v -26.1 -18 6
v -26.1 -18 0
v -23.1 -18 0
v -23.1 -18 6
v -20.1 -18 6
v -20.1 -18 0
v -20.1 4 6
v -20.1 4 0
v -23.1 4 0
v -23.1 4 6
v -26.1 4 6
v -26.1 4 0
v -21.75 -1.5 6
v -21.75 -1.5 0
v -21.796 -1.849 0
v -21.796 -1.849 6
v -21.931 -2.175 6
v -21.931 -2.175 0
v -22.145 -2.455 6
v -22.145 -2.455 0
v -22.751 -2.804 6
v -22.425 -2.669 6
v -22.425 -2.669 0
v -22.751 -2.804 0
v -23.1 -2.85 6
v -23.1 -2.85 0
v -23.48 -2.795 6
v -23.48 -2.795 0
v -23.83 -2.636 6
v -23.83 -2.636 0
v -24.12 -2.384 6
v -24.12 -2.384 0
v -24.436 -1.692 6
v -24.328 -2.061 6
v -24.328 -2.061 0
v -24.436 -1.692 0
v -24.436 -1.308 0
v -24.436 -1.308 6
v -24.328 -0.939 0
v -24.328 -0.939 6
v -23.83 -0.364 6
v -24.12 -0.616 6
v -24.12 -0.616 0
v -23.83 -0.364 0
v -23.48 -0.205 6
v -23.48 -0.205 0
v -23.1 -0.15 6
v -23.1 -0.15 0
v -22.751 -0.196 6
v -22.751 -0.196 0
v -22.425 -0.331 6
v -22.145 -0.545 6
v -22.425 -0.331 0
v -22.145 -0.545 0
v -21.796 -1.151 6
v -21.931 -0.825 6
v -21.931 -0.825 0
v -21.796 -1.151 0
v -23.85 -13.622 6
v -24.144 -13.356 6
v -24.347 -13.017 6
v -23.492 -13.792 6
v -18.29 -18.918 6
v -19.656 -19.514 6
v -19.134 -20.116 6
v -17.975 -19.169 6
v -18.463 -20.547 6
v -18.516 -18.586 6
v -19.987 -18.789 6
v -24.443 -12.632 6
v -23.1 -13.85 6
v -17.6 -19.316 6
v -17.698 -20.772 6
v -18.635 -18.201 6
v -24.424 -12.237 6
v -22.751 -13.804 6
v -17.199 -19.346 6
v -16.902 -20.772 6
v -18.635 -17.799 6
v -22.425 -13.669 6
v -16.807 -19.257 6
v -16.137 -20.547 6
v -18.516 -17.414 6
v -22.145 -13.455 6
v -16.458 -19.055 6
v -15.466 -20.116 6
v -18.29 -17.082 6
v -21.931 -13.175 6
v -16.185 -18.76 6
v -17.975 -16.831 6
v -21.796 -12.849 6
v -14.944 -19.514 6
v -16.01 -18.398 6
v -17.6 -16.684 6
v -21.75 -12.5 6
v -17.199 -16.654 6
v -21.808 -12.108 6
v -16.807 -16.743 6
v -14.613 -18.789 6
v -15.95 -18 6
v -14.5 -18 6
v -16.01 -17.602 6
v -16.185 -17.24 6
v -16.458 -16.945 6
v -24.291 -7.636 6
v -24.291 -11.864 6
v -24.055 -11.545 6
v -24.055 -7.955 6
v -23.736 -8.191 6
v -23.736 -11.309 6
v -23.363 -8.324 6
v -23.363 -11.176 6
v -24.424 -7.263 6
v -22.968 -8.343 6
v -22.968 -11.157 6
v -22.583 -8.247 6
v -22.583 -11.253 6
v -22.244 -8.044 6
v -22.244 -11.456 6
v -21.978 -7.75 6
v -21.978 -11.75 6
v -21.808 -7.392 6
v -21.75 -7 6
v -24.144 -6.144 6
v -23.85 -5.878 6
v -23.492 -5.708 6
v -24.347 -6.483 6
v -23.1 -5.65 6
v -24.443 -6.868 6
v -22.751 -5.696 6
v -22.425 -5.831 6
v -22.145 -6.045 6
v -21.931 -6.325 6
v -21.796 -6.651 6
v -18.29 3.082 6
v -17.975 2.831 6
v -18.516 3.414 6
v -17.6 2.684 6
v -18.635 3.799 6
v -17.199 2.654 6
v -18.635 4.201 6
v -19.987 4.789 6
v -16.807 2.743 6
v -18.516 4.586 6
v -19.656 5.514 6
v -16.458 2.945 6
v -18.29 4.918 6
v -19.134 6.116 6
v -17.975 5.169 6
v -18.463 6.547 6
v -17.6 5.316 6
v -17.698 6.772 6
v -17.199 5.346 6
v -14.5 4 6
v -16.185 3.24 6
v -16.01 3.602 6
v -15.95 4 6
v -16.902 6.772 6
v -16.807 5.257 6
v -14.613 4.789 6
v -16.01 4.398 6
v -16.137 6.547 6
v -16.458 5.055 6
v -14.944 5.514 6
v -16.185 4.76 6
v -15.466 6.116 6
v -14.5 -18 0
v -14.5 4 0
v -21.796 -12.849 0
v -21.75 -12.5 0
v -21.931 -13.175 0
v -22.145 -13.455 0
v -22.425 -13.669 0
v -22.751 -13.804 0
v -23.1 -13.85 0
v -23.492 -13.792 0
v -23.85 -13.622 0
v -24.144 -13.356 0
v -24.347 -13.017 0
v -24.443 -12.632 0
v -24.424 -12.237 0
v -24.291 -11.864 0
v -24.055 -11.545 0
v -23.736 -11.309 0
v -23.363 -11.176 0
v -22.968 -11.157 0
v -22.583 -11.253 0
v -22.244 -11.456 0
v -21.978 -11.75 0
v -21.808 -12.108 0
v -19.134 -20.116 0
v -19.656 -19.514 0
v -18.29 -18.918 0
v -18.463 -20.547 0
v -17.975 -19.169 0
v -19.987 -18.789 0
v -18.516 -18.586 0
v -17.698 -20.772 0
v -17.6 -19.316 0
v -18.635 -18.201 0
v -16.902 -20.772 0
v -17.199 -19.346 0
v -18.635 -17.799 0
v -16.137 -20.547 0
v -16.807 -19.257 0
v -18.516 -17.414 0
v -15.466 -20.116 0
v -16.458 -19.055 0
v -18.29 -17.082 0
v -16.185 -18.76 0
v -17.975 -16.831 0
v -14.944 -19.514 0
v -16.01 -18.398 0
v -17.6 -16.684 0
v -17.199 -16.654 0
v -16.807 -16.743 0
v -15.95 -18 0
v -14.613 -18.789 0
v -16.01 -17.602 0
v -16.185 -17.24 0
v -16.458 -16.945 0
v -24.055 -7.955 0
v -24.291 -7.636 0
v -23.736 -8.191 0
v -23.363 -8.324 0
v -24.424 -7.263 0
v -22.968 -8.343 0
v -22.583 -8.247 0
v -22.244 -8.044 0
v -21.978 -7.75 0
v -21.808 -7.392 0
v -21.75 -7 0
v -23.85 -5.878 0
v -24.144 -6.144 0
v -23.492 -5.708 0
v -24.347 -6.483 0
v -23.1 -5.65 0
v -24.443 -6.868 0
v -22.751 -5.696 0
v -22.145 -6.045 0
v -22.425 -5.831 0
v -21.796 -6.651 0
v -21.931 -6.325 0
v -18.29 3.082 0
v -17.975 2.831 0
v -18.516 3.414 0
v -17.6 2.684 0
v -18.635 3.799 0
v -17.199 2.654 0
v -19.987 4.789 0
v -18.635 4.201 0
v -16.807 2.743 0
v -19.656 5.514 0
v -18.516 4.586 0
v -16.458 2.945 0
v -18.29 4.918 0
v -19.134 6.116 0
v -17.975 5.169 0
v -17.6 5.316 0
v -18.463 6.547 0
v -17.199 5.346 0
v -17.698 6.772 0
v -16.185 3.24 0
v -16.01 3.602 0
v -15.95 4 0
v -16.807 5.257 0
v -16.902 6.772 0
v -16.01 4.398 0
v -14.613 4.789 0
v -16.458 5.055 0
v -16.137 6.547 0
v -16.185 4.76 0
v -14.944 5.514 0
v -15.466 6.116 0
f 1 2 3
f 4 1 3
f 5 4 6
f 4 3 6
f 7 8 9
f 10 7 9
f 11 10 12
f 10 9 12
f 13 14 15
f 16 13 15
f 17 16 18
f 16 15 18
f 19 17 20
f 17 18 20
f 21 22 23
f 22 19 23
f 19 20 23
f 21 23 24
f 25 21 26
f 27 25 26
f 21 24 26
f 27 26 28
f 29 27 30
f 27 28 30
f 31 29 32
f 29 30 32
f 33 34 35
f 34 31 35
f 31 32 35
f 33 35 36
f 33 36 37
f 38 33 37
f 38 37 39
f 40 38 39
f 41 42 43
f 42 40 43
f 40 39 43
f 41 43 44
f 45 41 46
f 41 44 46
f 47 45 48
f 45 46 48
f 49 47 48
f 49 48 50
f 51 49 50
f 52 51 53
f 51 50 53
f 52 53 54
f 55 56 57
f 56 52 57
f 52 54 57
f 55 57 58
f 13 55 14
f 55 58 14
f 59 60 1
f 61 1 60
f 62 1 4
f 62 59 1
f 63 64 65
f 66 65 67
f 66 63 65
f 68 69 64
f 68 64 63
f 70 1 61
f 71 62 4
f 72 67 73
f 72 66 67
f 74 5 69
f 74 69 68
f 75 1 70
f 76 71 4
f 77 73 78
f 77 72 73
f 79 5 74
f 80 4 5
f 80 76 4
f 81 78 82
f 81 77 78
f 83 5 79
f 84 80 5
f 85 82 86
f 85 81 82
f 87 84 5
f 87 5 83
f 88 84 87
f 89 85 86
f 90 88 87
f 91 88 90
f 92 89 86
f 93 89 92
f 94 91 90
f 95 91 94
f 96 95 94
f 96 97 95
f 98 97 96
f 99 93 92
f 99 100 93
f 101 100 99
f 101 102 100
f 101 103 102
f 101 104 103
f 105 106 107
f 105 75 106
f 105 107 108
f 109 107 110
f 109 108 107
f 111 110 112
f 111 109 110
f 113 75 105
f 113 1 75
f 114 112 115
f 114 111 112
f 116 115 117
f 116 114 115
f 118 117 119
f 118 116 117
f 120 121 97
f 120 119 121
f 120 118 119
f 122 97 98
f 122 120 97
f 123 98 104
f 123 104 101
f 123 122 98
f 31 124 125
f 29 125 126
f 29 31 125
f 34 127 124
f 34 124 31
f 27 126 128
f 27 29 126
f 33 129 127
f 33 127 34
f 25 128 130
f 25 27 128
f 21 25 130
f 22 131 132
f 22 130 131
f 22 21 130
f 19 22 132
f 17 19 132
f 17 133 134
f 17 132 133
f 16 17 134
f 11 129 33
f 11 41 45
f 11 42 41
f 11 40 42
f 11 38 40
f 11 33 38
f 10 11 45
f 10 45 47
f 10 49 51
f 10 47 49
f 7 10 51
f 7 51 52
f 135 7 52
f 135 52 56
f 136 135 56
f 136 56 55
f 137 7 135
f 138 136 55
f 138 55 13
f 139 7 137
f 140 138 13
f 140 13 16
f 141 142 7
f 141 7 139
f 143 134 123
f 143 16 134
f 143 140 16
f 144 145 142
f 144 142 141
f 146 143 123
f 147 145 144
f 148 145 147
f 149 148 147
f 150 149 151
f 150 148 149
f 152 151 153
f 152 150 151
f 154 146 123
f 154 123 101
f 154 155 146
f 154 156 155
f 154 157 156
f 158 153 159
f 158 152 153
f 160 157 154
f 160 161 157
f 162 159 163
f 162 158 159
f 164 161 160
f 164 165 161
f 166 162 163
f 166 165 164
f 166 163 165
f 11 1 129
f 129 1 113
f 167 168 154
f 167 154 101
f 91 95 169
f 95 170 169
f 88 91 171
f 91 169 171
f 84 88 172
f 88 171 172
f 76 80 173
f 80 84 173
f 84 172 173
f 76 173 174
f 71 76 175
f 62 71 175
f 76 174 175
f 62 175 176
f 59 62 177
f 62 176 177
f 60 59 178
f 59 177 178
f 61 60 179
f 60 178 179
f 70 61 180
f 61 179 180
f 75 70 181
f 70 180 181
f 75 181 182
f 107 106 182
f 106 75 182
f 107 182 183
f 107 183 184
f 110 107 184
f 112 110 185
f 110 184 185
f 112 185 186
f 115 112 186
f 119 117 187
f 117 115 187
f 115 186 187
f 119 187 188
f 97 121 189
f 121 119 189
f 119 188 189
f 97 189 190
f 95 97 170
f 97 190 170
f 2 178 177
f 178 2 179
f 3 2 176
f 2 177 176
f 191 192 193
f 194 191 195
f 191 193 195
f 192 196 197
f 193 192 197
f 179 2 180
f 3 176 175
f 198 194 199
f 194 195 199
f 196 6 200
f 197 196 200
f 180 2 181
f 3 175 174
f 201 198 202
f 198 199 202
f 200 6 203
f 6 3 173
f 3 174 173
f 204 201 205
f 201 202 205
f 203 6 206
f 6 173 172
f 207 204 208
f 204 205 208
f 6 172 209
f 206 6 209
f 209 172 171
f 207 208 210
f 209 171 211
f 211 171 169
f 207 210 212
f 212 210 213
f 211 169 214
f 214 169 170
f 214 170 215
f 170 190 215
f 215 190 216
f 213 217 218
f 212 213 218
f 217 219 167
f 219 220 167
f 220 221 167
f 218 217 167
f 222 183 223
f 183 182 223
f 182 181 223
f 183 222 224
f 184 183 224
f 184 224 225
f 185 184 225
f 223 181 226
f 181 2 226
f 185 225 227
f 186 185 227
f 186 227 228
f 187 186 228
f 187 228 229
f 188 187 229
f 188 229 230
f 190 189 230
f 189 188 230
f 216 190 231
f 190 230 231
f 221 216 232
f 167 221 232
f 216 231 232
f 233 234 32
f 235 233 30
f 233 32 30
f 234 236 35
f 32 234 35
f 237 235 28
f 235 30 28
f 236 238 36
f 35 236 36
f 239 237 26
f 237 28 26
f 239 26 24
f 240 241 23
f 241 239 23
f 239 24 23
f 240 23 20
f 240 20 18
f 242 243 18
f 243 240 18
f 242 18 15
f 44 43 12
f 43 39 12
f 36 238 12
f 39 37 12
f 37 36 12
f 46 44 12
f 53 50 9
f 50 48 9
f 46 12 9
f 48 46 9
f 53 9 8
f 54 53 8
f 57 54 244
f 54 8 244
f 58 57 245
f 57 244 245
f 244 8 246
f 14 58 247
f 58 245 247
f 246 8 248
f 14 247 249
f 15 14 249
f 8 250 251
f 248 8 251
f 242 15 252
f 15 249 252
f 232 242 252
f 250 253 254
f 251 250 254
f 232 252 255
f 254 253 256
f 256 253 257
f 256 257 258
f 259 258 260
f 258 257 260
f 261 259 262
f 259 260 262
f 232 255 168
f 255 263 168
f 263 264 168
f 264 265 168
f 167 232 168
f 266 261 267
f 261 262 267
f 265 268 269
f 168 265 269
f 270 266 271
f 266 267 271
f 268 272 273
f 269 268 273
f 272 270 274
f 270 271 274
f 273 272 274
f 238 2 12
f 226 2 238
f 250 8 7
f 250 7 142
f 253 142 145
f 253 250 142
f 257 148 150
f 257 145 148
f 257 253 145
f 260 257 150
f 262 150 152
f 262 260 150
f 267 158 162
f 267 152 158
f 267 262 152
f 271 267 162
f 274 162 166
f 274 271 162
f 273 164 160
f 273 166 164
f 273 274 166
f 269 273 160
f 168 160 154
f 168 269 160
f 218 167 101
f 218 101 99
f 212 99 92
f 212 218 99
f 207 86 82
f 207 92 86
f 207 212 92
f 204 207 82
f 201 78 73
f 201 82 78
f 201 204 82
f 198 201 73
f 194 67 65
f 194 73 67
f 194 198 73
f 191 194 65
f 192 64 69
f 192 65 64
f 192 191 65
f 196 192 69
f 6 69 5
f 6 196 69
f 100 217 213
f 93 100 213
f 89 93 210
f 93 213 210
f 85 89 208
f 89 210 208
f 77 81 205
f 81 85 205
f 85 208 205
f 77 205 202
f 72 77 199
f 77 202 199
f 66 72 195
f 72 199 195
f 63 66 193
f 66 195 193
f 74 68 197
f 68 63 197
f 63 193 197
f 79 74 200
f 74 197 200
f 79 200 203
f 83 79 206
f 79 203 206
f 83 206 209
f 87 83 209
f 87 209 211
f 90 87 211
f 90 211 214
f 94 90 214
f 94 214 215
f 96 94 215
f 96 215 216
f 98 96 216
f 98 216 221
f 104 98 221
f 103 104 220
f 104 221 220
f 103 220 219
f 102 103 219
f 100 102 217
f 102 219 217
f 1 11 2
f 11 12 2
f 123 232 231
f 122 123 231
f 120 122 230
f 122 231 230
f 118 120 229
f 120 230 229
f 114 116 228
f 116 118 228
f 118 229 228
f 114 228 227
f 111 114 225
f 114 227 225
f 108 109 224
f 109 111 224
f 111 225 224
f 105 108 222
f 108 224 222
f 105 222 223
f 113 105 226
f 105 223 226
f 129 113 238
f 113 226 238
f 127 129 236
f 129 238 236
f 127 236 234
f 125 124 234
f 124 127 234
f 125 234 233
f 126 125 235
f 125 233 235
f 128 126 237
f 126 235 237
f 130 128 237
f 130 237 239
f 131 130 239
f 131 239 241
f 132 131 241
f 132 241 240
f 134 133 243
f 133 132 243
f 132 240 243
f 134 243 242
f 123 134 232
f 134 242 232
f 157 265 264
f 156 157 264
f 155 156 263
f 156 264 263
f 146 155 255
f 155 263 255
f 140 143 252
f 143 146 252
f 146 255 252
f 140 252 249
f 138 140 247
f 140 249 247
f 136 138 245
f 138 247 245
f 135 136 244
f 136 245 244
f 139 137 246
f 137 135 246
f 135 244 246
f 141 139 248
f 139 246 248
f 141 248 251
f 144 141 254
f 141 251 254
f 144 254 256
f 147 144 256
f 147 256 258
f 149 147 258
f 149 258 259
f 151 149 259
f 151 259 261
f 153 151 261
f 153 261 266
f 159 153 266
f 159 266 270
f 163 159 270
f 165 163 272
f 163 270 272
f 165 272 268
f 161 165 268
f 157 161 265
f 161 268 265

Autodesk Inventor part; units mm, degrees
ref_plane "YZ Plane" through (0, 0, 0) normal (1, 0, 0) x (0, 1, 0)
ref_plane "XZ Plane" through (0, 0, 0) normal (0, 1, 0) x (-1, 0, 0)
ref_plane "XY Plane" through (0, 0, 0) normal (0, 0, 1) x (1, 0, 0)
ref_plane "작업 평면1" through (0, 0, 0) normal (0, 0, 1) x (1, 0, 0)
sketch "스케치1" plane through (0, 0, 0) normal (0, 0, 1) x (1, 0, 0)
  line L0 (-15, 14.5) -> (-11.5, 14.5) projected
  line L1 (-15, 14.5) -> (-20.1, 8.5) projected
  line L2 (-20.1, 8.5) -> (-20.1, -44.6) projected
  line L3 (-20.1, -44.6) -> (-15, -50.6) projected
  line L4 (-15, -50.6) -> (15, -50.6) projected
  line L5 (15, -50.6) -> (20.1, -44.6) projected
  line L6 (20.1, -44.6) -> (20.1, 8.5) projected
  line L7 (20.1, 8.5) -> (15, 14.5) projected
  line L8 (11.5, 14.5) -> (15, 14.5) projected
  arc A0 (14.5, 11.5) -> (11.5, 14.5) centre (11.5, 11.5) ccw projected
  line L9 (14.5, -42) -> (14.5, 11.5) projected
  arc A1 (11.5, -45) -> (14.5, -42) centre (11.5, -42) ccw projected
  line L10 (-11.5, -45) -> (11.5, -45) projected
  arc A2 (-14.5, -42) -> (-11.5, -45) centre (-11.5, -42) ccw projected
  line L11 (-14.5, 11.5) -> (-14.5, -42) projected
  arc A3 (-11.5, 14.5) -> (-14.5, 11.5) centre (-11.5, 11.5) ccw projected
  circle A4 centre (17.3, 4) radius 1.35 projected
  circle A5 centre (17.3, -18) radius 1.35 projected
  circle A6 centre (17.3, -40) radius 1.35 projected
  circle A7 centre (11, -47.8) radius 1.35 projected
  circle A8 centre (-17.3, 4) radius 1.35 projected
  circle A9 centre (-17.3, -18) radius 1.35 projected
  circle A10 centre (-17.3, -40) radius 1.35 projected
  circle A11 centre (-11, -47.8) radius 1.35 projected
  circle A12 centre (-17.3, -18) radius 2.8
  circle A13 centre (-17.3, 4) radius 2.8
  line L12 (-20.1, -18) -> (-20.1, 4)
  line L13 (-20.1, 4) -> (-26.1, 4)
  line L14 (-26.1, 4) -> (-26.1, -18)
  line L15 (-26.1, -18) -> (-20.1, -18)
  line L16 (-26.1, -18) -> (-26.1, -7)
  line L17 (-23.1, -18) -> (-23.1, -12.5)
  line L18 (-23.1, 4) -> (-23.1, -1.5)
  line L19 (-23.1, -1.5) -> (-23.1, -7)
  circle A14 centre (-23.1, -12.5) radius 1.35
  circle A15 centre (-23.1, -7) radius 1.35
  circle A16 centre (-23.1, -1.5) radius 1.35
  point P0 (0, 0)
  point P1 (-14.5, -18)
  point P2 (-14.5, 4)
  dimension "d0" = 6
  dimension "d1" = 11
  dimension "d2" = 5.5
  dimension "d3" = 2.7
  dimension "d4" = 2.7
  dimension "d5" = 2.7
extrude "돌출1" add sketch "스케치1" along normal blind 6 contours A13 L11 A12 L2 | A13 | L2 L15 L14 L13 | A12
properties part number "_idle_adt"
